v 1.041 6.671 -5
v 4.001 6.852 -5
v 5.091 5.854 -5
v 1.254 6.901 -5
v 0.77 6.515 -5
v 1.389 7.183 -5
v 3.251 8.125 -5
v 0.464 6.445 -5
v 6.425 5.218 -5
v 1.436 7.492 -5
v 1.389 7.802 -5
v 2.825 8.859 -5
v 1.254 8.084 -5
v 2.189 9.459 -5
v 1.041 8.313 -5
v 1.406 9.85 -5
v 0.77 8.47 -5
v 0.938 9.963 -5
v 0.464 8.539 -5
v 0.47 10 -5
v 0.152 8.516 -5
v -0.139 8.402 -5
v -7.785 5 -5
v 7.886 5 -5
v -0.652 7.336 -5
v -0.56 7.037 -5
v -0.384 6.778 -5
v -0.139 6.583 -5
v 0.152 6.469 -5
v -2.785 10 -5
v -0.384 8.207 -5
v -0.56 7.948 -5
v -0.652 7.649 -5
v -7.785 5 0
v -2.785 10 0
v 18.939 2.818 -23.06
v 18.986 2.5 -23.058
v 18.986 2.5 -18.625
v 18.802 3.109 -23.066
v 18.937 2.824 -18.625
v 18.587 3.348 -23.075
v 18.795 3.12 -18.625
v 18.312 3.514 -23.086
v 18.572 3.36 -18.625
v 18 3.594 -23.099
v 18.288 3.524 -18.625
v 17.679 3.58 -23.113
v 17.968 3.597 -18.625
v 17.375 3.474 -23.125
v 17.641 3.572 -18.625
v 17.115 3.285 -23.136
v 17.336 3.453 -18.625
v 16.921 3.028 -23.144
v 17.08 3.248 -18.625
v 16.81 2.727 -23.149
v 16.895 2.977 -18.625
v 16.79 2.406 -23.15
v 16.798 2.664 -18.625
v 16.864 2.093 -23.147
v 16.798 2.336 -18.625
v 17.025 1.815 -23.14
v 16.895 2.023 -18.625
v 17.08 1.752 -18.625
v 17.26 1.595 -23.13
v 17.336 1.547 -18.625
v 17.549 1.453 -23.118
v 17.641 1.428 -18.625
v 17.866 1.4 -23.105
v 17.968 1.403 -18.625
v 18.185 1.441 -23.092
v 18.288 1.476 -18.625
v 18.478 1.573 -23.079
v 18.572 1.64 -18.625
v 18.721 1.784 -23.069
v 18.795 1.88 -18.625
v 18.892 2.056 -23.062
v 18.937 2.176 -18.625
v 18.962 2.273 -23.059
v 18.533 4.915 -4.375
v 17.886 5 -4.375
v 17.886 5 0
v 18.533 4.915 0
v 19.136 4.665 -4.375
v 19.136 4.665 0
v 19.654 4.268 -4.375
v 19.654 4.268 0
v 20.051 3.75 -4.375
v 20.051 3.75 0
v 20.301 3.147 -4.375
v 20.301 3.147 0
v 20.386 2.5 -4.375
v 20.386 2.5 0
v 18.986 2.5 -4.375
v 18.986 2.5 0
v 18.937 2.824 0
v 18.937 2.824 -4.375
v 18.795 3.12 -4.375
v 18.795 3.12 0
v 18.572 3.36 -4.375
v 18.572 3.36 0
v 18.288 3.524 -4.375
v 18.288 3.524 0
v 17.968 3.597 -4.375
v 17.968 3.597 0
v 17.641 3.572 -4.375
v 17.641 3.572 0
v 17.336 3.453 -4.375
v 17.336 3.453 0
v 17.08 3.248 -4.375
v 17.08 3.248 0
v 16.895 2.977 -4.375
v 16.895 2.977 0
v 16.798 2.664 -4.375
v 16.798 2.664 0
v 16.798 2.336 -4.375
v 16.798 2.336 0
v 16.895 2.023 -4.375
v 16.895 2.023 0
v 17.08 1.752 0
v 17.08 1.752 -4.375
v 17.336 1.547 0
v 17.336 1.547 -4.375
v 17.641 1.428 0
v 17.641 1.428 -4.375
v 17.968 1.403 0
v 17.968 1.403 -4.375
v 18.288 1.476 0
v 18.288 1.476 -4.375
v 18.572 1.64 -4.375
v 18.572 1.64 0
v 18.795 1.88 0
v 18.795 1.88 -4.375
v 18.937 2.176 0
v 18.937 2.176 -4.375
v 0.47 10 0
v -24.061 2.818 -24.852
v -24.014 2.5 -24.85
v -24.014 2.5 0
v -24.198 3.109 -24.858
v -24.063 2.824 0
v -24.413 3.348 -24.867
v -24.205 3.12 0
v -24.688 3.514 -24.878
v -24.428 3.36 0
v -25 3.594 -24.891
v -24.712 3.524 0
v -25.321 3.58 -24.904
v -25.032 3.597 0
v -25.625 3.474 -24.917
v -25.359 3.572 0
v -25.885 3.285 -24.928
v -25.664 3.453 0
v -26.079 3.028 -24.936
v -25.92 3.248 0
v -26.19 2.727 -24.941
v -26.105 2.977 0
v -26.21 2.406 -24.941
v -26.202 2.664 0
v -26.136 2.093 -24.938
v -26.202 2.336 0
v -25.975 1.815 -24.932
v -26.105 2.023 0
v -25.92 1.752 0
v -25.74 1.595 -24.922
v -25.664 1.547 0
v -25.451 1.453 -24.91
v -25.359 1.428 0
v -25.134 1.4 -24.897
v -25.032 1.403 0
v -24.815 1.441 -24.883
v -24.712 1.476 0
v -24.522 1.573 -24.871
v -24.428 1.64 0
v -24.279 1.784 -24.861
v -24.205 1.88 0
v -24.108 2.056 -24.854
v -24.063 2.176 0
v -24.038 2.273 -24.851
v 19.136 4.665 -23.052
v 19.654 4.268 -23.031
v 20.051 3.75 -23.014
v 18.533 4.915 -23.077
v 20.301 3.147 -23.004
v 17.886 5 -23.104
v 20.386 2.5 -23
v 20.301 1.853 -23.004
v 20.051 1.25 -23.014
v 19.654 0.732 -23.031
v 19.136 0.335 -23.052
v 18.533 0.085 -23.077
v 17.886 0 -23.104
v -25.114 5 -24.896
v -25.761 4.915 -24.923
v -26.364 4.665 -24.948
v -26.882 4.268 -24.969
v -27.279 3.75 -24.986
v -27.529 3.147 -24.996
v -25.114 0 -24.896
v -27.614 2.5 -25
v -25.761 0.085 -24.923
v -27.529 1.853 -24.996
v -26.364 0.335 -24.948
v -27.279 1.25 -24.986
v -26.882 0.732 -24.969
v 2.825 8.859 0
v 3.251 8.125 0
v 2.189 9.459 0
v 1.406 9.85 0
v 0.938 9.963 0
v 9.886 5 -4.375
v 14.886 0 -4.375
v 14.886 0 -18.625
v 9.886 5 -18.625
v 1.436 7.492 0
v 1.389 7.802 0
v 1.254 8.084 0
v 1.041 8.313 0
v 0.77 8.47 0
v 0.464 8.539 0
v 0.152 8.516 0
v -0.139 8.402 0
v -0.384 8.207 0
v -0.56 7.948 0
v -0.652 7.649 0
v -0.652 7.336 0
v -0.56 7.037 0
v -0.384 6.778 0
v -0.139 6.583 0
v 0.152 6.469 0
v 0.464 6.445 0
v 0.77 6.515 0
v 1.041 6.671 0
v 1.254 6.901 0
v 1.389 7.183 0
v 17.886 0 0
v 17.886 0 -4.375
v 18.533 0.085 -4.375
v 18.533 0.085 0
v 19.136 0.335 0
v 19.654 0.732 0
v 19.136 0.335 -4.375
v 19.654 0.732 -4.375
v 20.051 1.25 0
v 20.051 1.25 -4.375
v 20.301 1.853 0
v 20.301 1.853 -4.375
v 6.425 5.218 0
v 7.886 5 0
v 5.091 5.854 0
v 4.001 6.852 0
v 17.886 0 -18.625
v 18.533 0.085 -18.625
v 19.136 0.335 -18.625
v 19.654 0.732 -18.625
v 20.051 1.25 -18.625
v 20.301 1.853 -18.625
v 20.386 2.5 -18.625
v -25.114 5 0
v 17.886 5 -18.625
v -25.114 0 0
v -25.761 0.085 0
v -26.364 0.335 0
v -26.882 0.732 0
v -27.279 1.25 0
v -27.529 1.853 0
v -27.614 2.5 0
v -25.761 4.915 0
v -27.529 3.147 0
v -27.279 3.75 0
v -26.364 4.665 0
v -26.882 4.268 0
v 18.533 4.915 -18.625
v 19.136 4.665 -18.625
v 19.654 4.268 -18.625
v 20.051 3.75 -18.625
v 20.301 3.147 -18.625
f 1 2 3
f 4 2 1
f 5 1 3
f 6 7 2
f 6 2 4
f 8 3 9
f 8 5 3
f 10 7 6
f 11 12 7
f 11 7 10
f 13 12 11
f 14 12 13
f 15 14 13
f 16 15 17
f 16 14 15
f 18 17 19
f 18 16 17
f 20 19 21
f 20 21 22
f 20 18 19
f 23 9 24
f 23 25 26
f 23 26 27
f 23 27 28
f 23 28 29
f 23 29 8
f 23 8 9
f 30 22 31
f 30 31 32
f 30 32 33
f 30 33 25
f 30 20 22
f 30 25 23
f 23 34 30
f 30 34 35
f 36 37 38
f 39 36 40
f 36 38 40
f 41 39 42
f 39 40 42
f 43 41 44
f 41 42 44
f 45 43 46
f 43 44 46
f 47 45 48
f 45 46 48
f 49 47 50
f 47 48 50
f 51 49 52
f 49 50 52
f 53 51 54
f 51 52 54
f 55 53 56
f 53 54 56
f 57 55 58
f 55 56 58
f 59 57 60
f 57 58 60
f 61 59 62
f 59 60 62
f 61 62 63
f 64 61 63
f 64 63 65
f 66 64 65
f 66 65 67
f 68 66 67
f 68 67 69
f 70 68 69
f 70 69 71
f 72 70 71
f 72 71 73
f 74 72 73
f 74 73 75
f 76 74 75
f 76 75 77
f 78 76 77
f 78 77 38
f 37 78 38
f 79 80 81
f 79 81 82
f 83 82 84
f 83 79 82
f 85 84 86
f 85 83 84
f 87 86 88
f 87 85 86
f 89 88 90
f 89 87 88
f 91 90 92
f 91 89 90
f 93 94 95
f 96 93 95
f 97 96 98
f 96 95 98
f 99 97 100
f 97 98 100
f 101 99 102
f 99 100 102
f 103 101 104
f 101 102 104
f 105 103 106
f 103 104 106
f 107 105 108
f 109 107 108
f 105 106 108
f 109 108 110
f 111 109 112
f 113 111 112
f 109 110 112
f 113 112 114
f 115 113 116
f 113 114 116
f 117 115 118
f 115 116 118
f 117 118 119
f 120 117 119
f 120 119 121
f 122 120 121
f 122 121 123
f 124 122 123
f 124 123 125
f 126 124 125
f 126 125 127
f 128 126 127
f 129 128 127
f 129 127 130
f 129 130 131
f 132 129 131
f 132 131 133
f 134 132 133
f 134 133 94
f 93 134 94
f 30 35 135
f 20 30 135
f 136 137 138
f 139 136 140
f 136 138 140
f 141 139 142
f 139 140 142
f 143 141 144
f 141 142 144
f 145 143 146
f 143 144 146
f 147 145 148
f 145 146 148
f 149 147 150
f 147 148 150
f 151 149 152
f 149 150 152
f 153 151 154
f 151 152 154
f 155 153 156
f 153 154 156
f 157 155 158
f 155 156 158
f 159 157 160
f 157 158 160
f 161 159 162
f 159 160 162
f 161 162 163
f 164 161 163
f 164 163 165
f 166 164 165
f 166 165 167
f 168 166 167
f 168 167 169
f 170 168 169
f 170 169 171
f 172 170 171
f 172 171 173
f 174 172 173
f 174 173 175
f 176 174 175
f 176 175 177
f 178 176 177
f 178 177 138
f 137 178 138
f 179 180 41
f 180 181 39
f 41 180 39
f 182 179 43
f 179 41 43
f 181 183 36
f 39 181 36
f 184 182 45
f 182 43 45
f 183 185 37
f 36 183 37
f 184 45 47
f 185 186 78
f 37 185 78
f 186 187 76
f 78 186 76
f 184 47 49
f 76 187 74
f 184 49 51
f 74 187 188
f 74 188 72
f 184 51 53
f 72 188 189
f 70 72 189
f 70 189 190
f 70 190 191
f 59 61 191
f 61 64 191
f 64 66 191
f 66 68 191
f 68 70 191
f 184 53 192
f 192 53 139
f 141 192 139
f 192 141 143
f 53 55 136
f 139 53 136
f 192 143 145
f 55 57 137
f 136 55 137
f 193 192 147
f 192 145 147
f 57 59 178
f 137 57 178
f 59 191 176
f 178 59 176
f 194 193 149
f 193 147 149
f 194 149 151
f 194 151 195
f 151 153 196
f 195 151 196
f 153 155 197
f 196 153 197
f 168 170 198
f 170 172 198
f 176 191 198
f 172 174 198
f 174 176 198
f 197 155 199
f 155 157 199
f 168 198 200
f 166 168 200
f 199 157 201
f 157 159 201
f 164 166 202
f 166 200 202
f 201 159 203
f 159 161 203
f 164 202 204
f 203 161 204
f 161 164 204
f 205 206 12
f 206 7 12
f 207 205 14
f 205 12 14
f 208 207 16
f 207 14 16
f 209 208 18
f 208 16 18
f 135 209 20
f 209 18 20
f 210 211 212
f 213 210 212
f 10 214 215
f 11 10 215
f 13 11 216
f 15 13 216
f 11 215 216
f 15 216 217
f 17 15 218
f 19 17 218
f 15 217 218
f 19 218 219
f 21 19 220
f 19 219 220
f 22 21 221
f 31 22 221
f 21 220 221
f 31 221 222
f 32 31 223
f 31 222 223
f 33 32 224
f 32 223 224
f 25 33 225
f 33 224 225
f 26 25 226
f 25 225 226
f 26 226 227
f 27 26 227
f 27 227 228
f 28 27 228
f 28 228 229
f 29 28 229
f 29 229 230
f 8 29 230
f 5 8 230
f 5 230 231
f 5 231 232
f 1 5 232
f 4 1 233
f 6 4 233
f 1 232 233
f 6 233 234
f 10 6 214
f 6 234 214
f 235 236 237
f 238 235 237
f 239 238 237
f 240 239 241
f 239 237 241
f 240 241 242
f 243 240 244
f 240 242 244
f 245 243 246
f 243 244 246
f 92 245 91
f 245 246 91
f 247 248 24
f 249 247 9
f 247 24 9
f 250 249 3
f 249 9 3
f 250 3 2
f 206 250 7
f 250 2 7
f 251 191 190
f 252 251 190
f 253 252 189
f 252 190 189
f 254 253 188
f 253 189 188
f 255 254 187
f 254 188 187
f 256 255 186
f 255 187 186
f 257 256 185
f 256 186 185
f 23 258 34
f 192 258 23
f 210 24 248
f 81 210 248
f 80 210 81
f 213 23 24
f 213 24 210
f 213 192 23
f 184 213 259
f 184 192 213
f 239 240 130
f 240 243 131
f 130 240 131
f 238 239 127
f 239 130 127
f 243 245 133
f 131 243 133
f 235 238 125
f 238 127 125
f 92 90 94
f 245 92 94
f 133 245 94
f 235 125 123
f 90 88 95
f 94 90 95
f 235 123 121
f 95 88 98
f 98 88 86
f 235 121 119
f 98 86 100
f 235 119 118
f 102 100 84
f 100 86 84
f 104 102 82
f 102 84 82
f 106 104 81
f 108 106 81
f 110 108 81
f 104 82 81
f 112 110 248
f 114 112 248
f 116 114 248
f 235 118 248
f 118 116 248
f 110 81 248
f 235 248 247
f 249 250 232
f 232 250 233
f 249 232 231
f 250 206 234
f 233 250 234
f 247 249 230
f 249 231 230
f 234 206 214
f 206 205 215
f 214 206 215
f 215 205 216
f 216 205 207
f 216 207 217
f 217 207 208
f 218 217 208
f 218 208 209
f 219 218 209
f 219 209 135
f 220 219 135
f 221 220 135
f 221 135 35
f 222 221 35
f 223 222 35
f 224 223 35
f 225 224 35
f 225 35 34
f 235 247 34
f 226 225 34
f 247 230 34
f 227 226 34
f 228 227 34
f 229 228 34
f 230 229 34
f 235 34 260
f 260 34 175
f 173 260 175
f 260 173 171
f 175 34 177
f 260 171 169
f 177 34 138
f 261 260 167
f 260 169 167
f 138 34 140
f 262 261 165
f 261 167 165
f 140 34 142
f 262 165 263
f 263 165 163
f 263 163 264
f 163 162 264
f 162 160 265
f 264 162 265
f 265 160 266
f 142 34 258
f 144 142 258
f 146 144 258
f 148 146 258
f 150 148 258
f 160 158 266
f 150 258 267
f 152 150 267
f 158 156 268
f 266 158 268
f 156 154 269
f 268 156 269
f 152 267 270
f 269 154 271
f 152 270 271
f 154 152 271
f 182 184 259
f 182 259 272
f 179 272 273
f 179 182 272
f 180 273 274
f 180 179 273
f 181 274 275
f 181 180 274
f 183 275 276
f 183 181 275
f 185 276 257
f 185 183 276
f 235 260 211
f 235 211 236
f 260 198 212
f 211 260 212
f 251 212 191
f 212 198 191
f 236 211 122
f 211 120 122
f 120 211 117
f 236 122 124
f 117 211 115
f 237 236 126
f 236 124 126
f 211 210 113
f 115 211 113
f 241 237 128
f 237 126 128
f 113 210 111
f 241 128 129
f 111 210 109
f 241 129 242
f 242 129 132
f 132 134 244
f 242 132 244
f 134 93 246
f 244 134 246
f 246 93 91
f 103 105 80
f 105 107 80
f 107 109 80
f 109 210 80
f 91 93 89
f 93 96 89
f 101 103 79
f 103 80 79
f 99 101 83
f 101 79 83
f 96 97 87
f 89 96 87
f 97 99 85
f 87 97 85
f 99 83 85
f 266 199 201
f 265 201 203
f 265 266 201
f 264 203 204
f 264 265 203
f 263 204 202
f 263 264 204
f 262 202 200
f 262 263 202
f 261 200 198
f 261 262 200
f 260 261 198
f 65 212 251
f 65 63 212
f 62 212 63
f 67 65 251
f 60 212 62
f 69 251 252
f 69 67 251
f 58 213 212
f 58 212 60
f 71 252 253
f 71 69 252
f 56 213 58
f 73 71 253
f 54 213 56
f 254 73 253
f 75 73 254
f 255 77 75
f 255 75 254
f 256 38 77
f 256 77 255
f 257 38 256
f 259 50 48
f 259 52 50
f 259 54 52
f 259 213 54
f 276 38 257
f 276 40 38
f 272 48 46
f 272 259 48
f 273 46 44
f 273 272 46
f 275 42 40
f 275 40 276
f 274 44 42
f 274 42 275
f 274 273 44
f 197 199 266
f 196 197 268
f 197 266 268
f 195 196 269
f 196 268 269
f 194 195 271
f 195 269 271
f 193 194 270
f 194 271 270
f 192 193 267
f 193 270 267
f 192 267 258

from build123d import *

# Parameters (mm, degrees)
BOSS_EXTRUDE1_DEPTH = 5
CUT_EXTRUDE1_REACH  = 39.584
SKETCH3_R           = 1.1
FILLET1_R           = 2.5
BOSS_EXTRUDE2_DEPTH = 5
SKETCH7_R           = 1.05
CUT_EXTRUDE3_DEPTH  = 5
FILLET2_R           = 5
CUT_EXTRUDE4_REACH  = 39.584
SKETCH8_W           = 5.5
SKETCH8_H           = 14.25
CHAMFER1_SIZE       = 5
FILLET3_R           = 3


with BuildPart() as part:
    # Sketch1 → Boss-Extrude1 (new body)
    with BuildSketch(Plane(origin=(0, 0, 0), x_dir=(1, 0, 0), z_dir=(0, 1, 0))):
        Polygon((-27.613970588, 0), (20.386029412, 0), (20.386029412, 23), (-27.613970588, 25), align=None)
    extrude(amount=BOSS_EXTRUDE1_DEPTH)

    # Cut-Extrude1: up to this plane
    cut_extrude1_end = Plane(origin=(-27.613970588, 5, -25), z_dir=(-0.04163054471218136, 0, 0.999133073092352))
    # Sketch3 → Cut-Extrude1 (cut, up to the surface)
    with BuildSketch(Plane.XY, mode=Mode.PRIVATE) as cut_extrude1_sk1:
        with Locations((-25.113970588, 2.5)):
            Circle(SKETCH3_R)
    cut_extrude1_tool1 = split(extrude(cut_extrude1_sk1.sketch, amount=-CUT_EXTRUDE1_REACH, mode=Mode.PRIVATE), bisect_by=cut_extrude1_end, keep=Keep.BOTH, mode=Mode.PRIVATE)
    add(cut_extrude1_tool1.solids().sort_by_distance((-25.113971, 2.5, 0))[0], mode=Mode.SUBTRACT)
    # Sketch3 → Cut-Extrude1 (cut, up to the surface)
    with BuildSketch(Plane.XY, mode=Mode.PRIVATE) as cut_extrude1_sk2:
        with Locations((17.886029412, 2.5)):
            Circle(SKETCH3_R)
    cut_extrude1_tool2 = split(extrude(cut_extrude1_sk2.sketch, amount=-CUT_EXTRUDE1_REACH, mode=Mode.PRIVATE), bisect_by=cut_extrude1_end, keep=Keep.BOTH, mode=Mode.PRIVATE)
    add(cut_extrude1_tool2.solids().sort_by_distance((17.886029, 2.5, 0))[0], mode=Mode.SUBTRACT)

    # Fillet1
    fillet1_edges = [part.edges().sort_by_distance(p)[0] for p in [
        (20.386029412, 0, -11.5),
        (20.386029412, 5, -11.5),
        (-27.613970588, 0, -12.5),
        (-27.613970588, 5, -12.5),
    ]]
    fillet(fillet1_edges, radius=FILLET1_R - 0.0001)  # a hair under: the kernel refuses the full size

    # Sketch4 → Boss-Extrude2 (add)
    with BuildSketch(Plane.XY):
        Polygon((-7.7850384, 5), (-2.7850384, 10), (2.886029412, 10), (2.886029412, 5), (-0.713970588, 5), (-4.249504494, 1.464466094), align=None)
    extrude(amount=-BOSS_EXTRUDE2_DEPTH)

    # Sketch7 → Cut-Extrude3 (cut)
    with BuildSketch(Plane.XY):
        with Locations((0.386029412, 7.492375144)):
            Circle(SKETCH7_R)
    extrude(amount=-CUT_EXTRUDE3_DEPTH, mode=Mode.SUBTRACT)

    # Fillet2
    fillet2_edges = [part.edges().sort_by_distance(p)[0] for p in [
        (2.886029412, 5, -2.5),
    ]]
    fillet(fillet2_edges, radius=FILLET2_R - 0.0001)  # a hair under: the kernel refuses the full size

    # Cut-Extrude4: up to this face of the body (flat: up to its plane)
    cut_extrude4_end = Plane(part.part.faces().sort_by_distance((-3.881478864, 0, -12.005573089))[0])
    # Sketch8 → Cut-Extrude4 (cut, up to the picked face)
    with BuildSketch(Plane(origin=(0, 5, 0), x_dir=(1, 0, 0), z_dir=(0, 1, 0)), mode=Mode.PRIVATE) as cut_extrude4_sk1:
        with Locations((17.636029412, 11.5)):
            Rectangle(SKETCH8_W, SKETCH8_H)
    cut_extrude4_tool1 = split(extrude(cut_extrude4_sk1.sketch, amount=-CUT_EXTRUDE4_REACH, mode=Mode.PRIVATE), bisect_by=cut_extrude4_end, keep=Keep.BOTH, mode=Mode.PRIVATE)
    add(cut_extrude4_tool1.solids().sort_by(Axis((17.636029, 5, -11.5), (0, -1, 0)))[0], mode=Mode.SUBTRACT)

    # Chamfer1
    chamfer1_edges = [part.edges().sort_by_distance(p)[0] for p in [
        (14.886029412, 5, -11.5),
    ]]
    chamfer(chamfer1_edges, length=CHAMFER1_SIZE - 0.0001)  # a hair under: the kernel refuses the full size

    # Fillet3
    fillet3_edges = [part.edges().sort_by_distance(p)[0] for p in [
        (2.886029412, 10, -2.5),
    ]]
    fillet(fillet3_edges, radius=FILLET3_R)


solid = part.part
